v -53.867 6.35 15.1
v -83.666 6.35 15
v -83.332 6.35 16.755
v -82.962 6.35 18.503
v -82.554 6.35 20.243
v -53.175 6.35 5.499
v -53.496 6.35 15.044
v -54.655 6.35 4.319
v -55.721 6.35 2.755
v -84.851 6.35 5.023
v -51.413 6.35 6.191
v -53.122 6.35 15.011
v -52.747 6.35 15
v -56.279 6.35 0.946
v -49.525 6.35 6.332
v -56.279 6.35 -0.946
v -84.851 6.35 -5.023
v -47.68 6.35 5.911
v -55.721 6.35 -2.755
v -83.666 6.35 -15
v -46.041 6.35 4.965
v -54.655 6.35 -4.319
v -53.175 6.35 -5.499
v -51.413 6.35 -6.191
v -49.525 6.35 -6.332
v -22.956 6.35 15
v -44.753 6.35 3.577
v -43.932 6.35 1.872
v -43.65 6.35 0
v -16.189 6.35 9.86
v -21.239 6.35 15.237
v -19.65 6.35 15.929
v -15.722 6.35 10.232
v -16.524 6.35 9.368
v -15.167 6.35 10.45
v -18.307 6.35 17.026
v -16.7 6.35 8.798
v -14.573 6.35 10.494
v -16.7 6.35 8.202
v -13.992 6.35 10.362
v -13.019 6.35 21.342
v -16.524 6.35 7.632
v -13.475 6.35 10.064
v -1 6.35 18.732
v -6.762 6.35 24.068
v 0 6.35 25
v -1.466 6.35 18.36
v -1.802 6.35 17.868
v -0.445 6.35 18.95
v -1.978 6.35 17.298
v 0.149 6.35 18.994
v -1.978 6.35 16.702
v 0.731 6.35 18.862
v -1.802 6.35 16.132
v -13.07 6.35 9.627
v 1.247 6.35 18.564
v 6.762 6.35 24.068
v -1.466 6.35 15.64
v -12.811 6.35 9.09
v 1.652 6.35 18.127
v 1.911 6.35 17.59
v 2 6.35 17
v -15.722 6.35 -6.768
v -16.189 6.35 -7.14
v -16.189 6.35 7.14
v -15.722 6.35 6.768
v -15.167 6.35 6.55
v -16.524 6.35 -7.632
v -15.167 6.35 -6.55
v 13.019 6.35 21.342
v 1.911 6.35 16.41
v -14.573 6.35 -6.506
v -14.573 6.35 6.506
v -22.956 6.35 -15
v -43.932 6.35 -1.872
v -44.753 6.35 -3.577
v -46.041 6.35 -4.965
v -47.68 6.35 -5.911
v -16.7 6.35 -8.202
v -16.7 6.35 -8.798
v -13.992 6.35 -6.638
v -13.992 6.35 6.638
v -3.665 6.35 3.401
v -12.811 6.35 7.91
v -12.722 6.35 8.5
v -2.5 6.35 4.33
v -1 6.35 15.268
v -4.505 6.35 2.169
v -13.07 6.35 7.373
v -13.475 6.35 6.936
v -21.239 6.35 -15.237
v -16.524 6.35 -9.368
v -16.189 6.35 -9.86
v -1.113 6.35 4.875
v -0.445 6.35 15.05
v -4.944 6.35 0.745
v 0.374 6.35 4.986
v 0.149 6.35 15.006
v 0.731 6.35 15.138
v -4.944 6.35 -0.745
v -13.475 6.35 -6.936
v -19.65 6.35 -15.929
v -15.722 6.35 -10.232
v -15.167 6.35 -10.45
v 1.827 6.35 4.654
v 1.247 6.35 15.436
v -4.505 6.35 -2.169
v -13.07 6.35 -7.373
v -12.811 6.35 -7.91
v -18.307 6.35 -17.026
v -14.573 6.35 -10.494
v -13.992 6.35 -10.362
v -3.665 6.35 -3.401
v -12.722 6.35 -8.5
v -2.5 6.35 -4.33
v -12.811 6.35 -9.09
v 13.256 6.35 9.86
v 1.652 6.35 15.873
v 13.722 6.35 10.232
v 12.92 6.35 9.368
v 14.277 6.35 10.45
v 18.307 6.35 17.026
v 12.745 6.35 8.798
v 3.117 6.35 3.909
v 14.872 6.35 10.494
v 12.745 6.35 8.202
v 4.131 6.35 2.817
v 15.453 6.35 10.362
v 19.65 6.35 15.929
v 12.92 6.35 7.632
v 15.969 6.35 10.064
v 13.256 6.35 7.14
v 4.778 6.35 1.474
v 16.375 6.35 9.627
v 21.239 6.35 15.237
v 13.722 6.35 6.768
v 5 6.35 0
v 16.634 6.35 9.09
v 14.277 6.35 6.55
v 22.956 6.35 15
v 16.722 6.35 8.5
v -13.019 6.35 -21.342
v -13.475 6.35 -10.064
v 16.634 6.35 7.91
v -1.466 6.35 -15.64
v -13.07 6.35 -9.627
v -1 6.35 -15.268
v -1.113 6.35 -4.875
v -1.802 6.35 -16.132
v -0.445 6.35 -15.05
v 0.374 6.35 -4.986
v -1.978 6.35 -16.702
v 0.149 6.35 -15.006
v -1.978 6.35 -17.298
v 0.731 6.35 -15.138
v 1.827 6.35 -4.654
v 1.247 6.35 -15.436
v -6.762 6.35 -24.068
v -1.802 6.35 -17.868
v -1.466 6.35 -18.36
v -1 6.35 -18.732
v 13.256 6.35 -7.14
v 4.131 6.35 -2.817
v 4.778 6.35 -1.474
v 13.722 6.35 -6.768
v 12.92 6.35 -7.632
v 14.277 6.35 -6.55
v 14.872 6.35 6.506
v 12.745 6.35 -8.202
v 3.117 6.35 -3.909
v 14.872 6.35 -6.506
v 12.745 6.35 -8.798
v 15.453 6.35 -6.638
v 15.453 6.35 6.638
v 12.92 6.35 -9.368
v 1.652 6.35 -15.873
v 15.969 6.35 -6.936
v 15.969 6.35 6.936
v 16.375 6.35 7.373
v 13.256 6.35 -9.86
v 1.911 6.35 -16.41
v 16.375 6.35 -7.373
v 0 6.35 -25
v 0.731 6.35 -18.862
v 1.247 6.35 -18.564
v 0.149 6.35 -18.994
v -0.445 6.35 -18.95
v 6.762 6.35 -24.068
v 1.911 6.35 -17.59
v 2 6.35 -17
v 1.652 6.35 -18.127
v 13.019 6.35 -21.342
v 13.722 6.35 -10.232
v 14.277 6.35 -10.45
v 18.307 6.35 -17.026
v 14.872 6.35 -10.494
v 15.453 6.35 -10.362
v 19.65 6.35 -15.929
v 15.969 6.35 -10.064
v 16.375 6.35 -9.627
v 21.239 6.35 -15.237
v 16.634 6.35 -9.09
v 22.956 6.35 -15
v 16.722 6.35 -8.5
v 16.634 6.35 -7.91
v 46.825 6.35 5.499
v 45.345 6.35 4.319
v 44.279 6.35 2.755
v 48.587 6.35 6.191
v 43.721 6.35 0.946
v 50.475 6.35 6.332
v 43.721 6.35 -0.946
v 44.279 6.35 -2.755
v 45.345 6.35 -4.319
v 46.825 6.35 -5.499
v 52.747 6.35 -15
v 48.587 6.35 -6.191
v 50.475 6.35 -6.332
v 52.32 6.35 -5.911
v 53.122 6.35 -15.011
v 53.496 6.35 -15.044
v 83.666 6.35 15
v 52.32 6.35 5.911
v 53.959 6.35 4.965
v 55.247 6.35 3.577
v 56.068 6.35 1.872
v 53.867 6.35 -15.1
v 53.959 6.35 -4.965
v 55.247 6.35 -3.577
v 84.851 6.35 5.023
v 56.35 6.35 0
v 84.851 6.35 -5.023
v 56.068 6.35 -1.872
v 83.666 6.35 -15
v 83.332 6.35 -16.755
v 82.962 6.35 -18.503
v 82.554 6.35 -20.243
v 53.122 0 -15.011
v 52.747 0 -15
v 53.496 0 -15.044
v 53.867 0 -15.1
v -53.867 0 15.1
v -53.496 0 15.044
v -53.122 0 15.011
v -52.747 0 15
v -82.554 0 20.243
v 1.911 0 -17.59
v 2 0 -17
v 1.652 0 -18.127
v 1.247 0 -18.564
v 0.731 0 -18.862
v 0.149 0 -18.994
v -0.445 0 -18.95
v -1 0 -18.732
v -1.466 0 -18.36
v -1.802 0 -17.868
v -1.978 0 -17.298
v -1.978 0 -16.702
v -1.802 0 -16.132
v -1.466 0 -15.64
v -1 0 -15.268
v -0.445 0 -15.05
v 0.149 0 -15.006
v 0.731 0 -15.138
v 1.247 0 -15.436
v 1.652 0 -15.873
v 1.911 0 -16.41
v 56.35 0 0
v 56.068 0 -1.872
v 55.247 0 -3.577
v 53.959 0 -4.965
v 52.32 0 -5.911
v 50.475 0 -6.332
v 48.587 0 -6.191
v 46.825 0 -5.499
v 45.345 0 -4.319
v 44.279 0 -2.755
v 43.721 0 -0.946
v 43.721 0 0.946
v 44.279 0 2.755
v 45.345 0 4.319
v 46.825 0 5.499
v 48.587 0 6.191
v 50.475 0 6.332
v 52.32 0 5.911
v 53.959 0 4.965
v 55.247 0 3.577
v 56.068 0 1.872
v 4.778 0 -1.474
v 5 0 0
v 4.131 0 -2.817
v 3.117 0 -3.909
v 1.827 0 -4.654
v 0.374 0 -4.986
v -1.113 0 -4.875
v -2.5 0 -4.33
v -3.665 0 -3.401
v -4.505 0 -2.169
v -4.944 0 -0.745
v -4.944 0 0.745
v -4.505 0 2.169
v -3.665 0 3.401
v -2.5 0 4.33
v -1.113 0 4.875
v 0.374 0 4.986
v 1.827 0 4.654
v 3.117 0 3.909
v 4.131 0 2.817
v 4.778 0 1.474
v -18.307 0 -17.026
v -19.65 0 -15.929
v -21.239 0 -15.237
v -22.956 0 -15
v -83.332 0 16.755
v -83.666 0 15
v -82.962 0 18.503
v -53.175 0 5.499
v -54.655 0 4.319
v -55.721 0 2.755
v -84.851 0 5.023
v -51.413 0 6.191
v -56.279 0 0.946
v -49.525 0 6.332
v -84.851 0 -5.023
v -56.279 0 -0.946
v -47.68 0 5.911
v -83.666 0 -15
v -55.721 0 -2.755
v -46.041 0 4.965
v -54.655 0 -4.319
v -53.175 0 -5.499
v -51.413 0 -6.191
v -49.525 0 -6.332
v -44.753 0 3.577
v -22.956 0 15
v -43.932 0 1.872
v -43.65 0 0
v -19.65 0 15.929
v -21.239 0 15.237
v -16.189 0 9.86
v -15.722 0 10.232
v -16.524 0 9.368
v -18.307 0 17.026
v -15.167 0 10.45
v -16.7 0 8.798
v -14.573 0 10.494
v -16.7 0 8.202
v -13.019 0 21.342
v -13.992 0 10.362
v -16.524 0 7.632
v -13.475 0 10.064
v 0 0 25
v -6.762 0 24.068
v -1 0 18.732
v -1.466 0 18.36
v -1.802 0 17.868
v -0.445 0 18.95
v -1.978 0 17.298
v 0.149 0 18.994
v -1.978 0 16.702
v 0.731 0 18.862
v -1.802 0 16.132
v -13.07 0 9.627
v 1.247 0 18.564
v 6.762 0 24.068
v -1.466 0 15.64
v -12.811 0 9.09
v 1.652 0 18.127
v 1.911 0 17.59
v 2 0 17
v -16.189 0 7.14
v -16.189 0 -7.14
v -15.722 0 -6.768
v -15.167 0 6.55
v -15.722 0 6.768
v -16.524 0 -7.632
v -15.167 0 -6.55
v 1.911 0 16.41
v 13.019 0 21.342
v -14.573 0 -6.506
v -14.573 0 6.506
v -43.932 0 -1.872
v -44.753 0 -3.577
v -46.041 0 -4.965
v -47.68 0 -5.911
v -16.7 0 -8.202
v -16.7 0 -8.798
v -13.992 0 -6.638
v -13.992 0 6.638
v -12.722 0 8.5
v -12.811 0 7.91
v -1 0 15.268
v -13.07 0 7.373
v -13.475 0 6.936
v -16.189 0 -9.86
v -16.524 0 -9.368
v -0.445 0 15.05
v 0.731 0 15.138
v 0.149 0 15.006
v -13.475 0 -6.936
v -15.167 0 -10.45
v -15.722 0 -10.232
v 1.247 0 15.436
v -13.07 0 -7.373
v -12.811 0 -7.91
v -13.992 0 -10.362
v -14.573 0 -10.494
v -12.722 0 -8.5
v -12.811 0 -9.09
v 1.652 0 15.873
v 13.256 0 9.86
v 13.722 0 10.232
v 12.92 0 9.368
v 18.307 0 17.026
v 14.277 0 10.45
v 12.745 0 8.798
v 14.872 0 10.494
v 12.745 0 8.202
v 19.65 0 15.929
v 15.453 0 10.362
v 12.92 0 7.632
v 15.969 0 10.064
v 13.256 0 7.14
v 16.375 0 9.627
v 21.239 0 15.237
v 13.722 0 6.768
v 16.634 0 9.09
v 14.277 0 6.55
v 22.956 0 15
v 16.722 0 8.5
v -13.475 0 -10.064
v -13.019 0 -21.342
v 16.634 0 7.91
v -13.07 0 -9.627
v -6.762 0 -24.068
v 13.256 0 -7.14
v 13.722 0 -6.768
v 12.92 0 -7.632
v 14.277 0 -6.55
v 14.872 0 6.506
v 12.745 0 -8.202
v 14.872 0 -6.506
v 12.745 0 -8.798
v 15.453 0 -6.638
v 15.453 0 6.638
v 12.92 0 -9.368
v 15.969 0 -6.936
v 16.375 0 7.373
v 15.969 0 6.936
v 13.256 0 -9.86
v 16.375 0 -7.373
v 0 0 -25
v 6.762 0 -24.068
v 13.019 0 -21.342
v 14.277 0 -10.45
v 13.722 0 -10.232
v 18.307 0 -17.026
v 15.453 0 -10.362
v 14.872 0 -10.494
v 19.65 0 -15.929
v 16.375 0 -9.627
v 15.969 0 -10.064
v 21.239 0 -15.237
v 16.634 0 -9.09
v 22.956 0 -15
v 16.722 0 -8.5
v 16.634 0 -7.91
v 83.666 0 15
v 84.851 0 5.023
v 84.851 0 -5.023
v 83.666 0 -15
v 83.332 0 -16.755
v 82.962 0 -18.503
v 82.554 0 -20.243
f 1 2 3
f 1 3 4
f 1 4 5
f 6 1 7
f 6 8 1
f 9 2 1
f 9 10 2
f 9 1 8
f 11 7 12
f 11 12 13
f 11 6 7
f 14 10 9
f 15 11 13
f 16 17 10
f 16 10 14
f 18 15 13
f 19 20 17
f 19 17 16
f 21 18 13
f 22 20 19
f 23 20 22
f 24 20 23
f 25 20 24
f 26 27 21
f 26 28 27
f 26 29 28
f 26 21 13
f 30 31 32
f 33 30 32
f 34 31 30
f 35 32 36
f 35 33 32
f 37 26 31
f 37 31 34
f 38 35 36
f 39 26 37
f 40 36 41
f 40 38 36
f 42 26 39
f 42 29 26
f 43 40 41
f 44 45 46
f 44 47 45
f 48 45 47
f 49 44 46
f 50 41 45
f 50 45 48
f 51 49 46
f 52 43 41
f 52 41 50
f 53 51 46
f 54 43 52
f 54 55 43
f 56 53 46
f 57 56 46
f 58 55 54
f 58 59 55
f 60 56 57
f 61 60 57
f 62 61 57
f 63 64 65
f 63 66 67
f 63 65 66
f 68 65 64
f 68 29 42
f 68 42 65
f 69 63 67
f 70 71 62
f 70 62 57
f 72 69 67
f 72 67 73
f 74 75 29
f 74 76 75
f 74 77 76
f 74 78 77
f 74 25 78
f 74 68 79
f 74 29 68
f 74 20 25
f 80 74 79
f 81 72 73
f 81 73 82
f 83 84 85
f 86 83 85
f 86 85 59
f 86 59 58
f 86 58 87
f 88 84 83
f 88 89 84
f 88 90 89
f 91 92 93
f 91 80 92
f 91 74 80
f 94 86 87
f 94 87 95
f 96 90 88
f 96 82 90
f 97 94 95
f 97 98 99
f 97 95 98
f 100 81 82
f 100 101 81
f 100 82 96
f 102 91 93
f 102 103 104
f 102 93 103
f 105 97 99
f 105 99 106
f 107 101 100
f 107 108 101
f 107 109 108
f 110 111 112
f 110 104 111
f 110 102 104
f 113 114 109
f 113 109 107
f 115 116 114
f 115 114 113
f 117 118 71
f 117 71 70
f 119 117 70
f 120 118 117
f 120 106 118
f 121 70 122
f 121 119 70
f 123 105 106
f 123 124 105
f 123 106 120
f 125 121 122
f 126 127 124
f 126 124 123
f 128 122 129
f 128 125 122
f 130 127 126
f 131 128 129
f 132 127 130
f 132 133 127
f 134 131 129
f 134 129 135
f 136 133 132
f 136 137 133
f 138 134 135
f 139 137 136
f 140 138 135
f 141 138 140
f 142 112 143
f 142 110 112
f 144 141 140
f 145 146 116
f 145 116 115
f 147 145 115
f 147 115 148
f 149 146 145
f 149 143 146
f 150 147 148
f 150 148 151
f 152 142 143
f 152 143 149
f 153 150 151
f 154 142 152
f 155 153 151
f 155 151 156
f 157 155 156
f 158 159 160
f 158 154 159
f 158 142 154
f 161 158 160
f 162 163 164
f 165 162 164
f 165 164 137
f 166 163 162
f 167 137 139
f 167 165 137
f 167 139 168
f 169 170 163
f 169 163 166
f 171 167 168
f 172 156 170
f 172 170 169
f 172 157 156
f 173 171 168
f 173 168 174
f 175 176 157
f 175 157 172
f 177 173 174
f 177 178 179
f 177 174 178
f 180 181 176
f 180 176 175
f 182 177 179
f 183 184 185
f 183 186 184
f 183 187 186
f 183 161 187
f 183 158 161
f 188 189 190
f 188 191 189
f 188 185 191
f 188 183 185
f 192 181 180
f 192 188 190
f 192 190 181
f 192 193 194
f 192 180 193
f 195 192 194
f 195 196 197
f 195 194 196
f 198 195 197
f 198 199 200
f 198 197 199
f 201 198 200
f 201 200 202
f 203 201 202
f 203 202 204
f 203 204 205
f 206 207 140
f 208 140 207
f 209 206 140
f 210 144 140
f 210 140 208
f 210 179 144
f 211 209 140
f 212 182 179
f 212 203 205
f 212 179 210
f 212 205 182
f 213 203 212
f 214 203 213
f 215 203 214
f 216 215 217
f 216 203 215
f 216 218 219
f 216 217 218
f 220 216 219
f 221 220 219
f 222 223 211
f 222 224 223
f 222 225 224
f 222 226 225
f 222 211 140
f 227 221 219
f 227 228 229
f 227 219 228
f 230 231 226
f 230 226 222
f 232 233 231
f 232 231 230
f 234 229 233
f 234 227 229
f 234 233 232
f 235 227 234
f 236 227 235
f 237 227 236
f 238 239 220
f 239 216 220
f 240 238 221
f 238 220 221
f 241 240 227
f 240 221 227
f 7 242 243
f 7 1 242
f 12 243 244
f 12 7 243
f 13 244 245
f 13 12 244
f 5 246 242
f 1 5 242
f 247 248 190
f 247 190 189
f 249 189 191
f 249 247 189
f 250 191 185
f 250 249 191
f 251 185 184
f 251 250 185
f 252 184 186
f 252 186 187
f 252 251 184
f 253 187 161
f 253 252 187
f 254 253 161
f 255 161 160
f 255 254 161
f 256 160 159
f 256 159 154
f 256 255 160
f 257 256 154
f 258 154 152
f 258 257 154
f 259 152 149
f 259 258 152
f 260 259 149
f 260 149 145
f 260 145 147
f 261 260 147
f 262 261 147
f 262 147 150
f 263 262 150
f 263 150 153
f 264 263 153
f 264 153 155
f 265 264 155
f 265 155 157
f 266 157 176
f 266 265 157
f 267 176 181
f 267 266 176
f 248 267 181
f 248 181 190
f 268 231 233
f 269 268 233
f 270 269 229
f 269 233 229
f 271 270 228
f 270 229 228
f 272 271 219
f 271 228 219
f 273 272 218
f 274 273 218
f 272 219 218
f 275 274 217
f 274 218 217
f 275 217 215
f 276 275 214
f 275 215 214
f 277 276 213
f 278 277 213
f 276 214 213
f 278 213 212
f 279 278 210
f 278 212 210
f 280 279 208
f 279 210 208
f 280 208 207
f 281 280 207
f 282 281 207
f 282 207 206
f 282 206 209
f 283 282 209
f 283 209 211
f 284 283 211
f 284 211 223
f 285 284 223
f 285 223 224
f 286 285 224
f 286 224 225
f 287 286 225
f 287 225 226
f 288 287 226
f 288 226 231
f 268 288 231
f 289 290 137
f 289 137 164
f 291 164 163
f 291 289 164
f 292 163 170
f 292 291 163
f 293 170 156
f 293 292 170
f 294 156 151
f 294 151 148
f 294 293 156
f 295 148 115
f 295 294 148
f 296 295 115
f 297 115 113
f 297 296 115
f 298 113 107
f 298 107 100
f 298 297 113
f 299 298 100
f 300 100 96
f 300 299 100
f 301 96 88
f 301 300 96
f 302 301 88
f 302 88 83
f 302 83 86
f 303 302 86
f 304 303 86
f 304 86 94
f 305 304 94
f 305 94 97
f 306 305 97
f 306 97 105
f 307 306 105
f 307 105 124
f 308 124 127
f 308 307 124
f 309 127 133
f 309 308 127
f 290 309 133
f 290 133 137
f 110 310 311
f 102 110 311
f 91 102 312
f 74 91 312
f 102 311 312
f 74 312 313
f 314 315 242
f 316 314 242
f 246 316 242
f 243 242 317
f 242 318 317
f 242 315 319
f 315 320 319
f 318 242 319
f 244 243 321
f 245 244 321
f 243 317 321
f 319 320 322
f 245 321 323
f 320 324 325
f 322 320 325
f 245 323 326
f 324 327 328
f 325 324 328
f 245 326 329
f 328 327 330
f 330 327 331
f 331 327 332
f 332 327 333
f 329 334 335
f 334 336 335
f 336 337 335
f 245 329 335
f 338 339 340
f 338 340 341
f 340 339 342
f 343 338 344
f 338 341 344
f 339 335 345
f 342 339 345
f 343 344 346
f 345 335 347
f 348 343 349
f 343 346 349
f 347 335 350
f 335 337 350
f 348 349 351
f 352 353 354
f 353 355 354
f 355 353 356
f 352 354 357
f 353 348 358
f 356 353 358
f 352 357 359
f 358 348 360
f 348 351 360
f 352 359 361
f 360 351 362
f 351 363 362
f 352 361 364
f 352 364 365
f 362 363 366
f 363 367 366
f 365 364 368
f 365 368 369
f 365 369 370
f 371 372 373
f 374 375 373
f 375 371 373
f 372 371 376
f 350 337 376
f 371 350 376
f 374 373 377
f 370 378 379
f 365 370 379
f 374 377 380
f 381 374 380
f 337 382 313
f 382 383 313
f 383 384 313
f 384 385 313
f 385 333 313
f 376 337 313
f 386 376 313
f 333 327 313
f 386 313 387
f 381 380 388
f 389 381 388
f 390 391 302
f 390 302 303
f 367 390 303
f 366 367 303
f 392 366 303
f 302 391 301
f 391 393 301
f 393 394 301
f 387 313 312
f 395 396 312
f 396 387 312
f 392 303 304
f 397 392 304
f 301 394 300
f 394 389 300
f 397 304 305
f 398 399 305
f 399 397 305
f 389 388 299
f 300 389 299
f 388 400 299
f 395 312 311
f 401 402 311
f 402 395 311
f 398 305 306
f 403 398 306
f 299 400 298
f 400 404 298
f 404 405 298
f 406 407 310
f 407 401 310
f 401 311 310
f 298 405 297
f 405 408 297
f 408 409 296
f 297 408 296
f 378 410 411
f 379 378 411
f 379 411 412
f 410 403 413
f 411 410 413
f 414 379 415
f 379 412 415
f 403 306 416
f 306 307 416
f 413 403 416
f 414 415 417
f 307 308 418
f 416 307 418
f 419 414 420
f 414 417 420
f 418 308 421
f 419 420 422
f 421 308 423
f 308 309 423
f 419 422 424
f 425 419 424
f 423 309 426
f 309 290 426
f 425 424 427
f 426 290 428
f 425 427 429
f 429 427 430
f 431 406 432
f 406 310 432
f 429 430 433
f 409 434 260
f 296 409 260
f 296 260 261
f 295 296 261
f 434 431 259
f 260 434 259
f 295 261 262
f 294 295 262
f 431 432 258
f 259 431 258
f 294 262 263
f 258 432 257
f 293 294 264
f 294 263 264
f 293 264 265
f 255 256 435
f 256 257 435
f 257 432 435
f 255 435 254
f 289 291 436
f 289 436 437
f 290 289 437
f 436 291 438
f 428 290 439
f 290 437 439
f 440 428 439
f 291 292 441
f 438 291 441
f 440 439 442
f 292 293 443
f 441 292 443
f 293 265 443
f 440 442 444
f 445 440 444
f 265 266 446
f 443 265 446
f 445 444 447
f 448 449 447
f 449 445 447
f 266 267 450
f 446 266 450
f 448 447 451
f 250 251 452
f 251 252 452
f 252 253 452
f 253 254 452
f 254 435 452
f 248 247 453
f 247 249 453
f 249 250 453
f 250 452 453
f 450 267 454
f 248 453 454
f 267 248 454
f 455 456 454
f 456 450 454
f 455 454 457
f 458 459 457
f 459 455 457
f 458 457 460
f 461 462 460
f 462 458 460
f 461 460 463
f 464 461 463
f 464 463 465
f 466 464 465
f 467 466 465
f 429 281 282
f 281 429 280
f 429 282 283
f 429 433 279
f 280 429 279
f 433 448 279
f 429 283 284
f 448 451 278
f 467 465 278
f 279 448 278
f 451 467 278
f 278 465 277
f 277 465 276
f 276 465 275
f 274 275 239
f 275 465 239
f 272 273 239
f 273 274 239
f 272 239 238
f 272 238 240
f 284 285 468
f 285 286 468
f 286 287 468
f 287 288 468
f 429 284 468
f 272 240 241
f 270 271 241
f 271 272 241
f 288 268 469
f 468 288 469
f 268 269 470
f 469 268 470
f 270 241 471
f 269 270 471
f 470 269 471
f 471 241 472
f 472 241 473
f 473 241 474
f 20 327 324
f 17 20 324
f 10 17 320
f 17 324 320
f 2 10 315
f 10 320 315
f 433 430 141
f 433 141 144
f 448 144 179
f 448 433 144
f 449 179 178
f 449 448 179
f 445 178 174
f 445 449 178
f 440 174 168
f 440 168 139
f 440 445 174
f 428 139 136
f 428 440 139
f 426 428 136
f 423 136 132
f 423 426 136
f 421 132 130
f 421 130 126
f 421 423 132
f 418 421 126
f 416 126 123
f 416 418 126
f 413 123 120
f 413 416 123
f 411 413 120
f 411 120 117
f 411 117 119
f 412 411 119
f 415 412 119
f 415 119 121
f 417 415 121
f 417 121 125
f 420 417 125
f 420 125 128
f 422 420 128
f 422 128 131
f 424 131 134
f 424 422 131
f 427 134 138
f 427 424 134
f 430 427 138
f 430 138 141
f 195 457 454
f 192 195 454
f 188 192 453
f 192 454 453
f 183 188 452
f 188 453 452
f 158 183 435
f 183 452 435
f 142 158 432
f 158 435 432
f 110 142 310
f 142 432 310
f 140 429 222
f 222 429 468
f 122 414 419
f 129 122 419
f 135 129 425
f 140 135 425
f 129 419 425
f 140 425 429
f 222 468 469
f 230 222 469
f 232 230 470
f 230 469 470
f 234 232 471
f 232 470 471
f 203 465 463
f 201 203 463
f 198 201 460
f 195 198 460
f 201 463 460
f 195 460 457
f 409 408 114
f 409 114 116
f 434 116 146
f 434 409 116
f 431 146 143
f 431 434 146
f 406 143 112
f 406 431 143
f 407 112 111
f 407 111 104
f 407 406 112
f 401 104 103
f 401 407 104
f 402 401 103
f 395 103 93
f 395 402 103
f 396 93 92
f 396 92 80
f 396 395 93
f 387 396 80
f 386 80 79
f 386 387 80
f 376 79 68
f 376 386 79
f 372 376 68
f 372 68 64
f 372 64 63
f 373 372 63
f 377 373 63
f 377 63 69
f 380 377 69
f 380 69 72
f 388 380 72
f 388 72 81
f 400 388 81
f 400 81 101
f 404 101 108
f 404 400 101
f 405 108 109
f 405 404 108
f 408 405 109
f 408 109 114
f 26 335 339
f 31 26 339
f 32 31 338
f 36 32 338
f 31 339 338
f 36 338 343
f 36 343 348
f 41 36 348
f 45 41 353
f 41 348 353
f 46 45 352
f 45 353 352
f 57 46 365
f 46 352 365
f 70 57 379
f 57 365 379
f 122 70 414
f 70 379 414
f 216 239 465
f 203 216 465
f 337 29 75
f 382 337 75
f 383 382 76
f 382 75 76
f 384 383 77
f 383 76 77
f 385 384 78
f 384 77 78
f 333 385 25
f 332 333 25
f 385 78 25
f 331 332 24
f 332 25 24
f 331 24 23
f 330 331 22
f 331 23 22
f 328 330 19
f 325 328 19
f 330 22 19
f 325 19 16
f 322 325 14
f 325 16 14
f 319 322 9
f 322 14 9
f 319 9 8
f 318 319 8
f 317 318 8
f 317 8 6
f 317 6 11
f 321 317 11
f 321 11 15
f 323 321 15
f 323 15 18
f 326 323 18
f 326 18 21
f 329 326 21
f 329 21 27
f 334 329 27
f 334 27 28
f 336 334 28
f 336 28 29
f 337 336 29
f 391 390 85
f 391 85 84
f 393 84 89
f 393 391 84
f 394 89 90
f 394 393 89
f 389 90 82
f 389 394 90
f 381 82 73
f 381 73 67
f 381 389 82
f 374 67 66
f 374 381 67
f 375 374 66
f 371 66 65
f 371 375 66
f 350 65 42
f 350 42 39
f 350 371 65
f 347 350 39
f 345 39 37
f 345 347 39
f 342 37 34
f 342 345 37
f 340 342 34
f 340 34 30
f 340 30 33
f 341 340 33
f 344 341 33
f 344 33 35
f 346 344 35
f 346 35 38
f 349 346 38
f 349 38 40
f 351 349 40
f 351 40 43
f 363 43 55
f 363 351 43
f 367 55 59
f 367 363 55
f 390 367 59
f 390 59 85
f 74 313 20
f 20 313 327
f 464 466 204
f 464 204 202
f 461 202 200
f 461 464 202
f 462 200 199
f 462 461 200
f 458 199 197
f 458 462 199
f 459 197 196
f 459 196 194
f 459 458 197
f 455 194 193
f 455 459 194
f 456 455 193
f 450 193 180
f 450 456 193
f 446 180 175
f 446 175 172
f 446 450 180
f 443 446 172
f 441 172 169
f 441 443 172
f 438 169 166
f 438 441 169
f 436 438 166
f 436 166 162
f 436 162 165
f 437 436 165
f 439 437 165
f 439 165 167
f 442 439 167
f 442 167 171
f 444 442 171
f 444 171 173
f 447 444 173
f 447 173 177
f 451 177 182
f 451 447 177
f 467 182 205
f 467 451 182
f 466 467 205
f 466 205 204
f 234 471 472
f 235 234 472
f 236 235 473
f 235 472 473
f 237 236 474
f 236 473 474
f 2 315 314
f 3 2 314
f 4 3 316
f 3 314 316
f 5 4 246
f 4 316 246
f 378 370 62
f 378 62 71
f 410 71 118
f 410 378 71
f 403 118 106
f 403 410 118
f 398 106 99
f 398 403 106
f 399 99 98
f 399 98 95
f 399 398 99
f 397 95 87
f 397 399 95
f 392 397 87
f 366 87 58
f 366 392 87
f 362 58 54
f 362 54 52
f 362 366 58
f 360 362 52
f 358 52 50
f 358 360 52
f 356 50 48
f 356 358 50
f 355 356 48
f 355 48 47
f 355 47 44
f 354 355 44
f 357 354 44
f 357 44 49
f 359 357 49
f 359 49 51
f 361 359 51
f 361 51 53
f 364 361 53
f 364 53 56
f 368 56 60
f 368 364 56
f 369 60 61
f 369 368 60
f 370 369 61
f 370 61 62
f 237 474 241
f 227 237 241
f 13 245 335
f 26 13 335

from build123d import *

# Parameters (mm, degrees)
CROQUIS1_R              = 5
CROQUIS1_R_2            = 2
SALIENTE_EXTRUIR1_DEPTH = 6.35
REDONDEO1_R             = 6.35
CROQUIS2_R              = 6.35
CORTAR_EXTRUIR1_DEPTH   = 7.35


with BuildPart() as part:
    # Croquis1 → Saliente-Extruir1 (new body)
    with BuildSketch(Plane(origin=(0, 0, 0), x_dir=(1, 0, 0), z_dir=(0, 1, 0))):
        with BuildLine():
            Line((-22.956480566, 15), (-83.666002653, 15))
            ThreePointArc((-83.666002653, 15), (-85, 0), (-83.666002653, -15))
            ThreePointArc((-83.666002653, -15), (-83.151528449, -17.630181979), (-82.554391371, -20.242837383))
            Line((-82.554391371, -20.242837383), (-53.31124161, -15))
            Line((-53.31124161, -15), (-22.956480566, -15))
            ThreePointArc((-22.956480566, -15), (-20.420534839, -15.528361119), (-18.306603323, -17.025518341))
            ThreePointArc((-18.306603323, -17.025518341), (0, -25), (18.306603323, -17.025518341))
            ThreePointArc((18.306603323, -17.025518341), (20.420534839, -15.528361119), (22.956480566, -15))
            Line((22.956480566, -15), (83.666002653, -15))
            ThreePointArc((83.666002653, -15), (85, 0), (83.666002653, 15))
            ThreePointArc((83.666002653, 15), (83.151528449, 17.630181979), (82.554391371, 20.242837383))
            Line((82.554391371, 20.242837383), (53.31124161, 15))
            Line((53.31124161, 15), (22.956480566, 15))
            ThreePointArc((22.956480566, 15), (20.420534839, 15.528361119), (18.306603323, 17.025518341))
            ThreePointArc((18.306603323, 17.025518341), (0, 25), (-18.306603323, 17.025518341))
            ThreePointArc((-18.306603323, 17.025518341), (-20.420534839, 15.528361119), (-22.956480566, 15))
        make_face()
        Circle(CROQUIS1_R, mode=Mode.SUBTRACT)
        with Locations((0, 17)):
            Circle(CROQUIS1_R_2, mode=Mode.SUBTRACT)
        with Locations((14.722431864, 8.5)):
            Circle(CROQUIS1_R_2, mode=Mode.SUBTRACT)
        with Locations((14.722431864, -8.5)):
            Circle(CROQUIS1_R_2, mode=Mode.SUBTRACT)
        with Locations((0, -17)):
            Circle(CROQUIS1_R_2, mode=Mode.SUBTRACT)
        with Locations((-14.722431864, -8.5)):
            Circle(CROQUIS1_R_2, mode=Mode.SUBTRACT)
        with Locations((-14.722431864, 8.5)):
            Circle(CROQUIS1_R_2, mode=Mode.SUBTRACT)
    extrude(amount=SALIENTE_EXTRUIR1_DEPTH)

    # Redondeo1
    redondeo1_edges = [part.edges().sort_by_distance(p)[0] for p in [
        (53.31124161, 3.175, -15),
        (-53.31124161, 3.175, 15),
    ]]
    fillet(redondeo1_edges, radius=REDONDEO1_R)

    # Croquis2 → Cortar-Extruir1 (cut, through all)
    with BuildSketch(Plane(origin=(0, 6.35, 0), x_dir=(1, 0, 0), z_dir=(0, 1, 0))):
        with Locations((-50, 0)):
            Circle(CROQUIS2_R)
        with Locations((50, 0)):
            Circle(CROQUIS2_R)
    extrude(amount=-CORTAR_EXTRUIR1_DEPTH, mode=Mode.SUBTRACT)


solid = part.part
